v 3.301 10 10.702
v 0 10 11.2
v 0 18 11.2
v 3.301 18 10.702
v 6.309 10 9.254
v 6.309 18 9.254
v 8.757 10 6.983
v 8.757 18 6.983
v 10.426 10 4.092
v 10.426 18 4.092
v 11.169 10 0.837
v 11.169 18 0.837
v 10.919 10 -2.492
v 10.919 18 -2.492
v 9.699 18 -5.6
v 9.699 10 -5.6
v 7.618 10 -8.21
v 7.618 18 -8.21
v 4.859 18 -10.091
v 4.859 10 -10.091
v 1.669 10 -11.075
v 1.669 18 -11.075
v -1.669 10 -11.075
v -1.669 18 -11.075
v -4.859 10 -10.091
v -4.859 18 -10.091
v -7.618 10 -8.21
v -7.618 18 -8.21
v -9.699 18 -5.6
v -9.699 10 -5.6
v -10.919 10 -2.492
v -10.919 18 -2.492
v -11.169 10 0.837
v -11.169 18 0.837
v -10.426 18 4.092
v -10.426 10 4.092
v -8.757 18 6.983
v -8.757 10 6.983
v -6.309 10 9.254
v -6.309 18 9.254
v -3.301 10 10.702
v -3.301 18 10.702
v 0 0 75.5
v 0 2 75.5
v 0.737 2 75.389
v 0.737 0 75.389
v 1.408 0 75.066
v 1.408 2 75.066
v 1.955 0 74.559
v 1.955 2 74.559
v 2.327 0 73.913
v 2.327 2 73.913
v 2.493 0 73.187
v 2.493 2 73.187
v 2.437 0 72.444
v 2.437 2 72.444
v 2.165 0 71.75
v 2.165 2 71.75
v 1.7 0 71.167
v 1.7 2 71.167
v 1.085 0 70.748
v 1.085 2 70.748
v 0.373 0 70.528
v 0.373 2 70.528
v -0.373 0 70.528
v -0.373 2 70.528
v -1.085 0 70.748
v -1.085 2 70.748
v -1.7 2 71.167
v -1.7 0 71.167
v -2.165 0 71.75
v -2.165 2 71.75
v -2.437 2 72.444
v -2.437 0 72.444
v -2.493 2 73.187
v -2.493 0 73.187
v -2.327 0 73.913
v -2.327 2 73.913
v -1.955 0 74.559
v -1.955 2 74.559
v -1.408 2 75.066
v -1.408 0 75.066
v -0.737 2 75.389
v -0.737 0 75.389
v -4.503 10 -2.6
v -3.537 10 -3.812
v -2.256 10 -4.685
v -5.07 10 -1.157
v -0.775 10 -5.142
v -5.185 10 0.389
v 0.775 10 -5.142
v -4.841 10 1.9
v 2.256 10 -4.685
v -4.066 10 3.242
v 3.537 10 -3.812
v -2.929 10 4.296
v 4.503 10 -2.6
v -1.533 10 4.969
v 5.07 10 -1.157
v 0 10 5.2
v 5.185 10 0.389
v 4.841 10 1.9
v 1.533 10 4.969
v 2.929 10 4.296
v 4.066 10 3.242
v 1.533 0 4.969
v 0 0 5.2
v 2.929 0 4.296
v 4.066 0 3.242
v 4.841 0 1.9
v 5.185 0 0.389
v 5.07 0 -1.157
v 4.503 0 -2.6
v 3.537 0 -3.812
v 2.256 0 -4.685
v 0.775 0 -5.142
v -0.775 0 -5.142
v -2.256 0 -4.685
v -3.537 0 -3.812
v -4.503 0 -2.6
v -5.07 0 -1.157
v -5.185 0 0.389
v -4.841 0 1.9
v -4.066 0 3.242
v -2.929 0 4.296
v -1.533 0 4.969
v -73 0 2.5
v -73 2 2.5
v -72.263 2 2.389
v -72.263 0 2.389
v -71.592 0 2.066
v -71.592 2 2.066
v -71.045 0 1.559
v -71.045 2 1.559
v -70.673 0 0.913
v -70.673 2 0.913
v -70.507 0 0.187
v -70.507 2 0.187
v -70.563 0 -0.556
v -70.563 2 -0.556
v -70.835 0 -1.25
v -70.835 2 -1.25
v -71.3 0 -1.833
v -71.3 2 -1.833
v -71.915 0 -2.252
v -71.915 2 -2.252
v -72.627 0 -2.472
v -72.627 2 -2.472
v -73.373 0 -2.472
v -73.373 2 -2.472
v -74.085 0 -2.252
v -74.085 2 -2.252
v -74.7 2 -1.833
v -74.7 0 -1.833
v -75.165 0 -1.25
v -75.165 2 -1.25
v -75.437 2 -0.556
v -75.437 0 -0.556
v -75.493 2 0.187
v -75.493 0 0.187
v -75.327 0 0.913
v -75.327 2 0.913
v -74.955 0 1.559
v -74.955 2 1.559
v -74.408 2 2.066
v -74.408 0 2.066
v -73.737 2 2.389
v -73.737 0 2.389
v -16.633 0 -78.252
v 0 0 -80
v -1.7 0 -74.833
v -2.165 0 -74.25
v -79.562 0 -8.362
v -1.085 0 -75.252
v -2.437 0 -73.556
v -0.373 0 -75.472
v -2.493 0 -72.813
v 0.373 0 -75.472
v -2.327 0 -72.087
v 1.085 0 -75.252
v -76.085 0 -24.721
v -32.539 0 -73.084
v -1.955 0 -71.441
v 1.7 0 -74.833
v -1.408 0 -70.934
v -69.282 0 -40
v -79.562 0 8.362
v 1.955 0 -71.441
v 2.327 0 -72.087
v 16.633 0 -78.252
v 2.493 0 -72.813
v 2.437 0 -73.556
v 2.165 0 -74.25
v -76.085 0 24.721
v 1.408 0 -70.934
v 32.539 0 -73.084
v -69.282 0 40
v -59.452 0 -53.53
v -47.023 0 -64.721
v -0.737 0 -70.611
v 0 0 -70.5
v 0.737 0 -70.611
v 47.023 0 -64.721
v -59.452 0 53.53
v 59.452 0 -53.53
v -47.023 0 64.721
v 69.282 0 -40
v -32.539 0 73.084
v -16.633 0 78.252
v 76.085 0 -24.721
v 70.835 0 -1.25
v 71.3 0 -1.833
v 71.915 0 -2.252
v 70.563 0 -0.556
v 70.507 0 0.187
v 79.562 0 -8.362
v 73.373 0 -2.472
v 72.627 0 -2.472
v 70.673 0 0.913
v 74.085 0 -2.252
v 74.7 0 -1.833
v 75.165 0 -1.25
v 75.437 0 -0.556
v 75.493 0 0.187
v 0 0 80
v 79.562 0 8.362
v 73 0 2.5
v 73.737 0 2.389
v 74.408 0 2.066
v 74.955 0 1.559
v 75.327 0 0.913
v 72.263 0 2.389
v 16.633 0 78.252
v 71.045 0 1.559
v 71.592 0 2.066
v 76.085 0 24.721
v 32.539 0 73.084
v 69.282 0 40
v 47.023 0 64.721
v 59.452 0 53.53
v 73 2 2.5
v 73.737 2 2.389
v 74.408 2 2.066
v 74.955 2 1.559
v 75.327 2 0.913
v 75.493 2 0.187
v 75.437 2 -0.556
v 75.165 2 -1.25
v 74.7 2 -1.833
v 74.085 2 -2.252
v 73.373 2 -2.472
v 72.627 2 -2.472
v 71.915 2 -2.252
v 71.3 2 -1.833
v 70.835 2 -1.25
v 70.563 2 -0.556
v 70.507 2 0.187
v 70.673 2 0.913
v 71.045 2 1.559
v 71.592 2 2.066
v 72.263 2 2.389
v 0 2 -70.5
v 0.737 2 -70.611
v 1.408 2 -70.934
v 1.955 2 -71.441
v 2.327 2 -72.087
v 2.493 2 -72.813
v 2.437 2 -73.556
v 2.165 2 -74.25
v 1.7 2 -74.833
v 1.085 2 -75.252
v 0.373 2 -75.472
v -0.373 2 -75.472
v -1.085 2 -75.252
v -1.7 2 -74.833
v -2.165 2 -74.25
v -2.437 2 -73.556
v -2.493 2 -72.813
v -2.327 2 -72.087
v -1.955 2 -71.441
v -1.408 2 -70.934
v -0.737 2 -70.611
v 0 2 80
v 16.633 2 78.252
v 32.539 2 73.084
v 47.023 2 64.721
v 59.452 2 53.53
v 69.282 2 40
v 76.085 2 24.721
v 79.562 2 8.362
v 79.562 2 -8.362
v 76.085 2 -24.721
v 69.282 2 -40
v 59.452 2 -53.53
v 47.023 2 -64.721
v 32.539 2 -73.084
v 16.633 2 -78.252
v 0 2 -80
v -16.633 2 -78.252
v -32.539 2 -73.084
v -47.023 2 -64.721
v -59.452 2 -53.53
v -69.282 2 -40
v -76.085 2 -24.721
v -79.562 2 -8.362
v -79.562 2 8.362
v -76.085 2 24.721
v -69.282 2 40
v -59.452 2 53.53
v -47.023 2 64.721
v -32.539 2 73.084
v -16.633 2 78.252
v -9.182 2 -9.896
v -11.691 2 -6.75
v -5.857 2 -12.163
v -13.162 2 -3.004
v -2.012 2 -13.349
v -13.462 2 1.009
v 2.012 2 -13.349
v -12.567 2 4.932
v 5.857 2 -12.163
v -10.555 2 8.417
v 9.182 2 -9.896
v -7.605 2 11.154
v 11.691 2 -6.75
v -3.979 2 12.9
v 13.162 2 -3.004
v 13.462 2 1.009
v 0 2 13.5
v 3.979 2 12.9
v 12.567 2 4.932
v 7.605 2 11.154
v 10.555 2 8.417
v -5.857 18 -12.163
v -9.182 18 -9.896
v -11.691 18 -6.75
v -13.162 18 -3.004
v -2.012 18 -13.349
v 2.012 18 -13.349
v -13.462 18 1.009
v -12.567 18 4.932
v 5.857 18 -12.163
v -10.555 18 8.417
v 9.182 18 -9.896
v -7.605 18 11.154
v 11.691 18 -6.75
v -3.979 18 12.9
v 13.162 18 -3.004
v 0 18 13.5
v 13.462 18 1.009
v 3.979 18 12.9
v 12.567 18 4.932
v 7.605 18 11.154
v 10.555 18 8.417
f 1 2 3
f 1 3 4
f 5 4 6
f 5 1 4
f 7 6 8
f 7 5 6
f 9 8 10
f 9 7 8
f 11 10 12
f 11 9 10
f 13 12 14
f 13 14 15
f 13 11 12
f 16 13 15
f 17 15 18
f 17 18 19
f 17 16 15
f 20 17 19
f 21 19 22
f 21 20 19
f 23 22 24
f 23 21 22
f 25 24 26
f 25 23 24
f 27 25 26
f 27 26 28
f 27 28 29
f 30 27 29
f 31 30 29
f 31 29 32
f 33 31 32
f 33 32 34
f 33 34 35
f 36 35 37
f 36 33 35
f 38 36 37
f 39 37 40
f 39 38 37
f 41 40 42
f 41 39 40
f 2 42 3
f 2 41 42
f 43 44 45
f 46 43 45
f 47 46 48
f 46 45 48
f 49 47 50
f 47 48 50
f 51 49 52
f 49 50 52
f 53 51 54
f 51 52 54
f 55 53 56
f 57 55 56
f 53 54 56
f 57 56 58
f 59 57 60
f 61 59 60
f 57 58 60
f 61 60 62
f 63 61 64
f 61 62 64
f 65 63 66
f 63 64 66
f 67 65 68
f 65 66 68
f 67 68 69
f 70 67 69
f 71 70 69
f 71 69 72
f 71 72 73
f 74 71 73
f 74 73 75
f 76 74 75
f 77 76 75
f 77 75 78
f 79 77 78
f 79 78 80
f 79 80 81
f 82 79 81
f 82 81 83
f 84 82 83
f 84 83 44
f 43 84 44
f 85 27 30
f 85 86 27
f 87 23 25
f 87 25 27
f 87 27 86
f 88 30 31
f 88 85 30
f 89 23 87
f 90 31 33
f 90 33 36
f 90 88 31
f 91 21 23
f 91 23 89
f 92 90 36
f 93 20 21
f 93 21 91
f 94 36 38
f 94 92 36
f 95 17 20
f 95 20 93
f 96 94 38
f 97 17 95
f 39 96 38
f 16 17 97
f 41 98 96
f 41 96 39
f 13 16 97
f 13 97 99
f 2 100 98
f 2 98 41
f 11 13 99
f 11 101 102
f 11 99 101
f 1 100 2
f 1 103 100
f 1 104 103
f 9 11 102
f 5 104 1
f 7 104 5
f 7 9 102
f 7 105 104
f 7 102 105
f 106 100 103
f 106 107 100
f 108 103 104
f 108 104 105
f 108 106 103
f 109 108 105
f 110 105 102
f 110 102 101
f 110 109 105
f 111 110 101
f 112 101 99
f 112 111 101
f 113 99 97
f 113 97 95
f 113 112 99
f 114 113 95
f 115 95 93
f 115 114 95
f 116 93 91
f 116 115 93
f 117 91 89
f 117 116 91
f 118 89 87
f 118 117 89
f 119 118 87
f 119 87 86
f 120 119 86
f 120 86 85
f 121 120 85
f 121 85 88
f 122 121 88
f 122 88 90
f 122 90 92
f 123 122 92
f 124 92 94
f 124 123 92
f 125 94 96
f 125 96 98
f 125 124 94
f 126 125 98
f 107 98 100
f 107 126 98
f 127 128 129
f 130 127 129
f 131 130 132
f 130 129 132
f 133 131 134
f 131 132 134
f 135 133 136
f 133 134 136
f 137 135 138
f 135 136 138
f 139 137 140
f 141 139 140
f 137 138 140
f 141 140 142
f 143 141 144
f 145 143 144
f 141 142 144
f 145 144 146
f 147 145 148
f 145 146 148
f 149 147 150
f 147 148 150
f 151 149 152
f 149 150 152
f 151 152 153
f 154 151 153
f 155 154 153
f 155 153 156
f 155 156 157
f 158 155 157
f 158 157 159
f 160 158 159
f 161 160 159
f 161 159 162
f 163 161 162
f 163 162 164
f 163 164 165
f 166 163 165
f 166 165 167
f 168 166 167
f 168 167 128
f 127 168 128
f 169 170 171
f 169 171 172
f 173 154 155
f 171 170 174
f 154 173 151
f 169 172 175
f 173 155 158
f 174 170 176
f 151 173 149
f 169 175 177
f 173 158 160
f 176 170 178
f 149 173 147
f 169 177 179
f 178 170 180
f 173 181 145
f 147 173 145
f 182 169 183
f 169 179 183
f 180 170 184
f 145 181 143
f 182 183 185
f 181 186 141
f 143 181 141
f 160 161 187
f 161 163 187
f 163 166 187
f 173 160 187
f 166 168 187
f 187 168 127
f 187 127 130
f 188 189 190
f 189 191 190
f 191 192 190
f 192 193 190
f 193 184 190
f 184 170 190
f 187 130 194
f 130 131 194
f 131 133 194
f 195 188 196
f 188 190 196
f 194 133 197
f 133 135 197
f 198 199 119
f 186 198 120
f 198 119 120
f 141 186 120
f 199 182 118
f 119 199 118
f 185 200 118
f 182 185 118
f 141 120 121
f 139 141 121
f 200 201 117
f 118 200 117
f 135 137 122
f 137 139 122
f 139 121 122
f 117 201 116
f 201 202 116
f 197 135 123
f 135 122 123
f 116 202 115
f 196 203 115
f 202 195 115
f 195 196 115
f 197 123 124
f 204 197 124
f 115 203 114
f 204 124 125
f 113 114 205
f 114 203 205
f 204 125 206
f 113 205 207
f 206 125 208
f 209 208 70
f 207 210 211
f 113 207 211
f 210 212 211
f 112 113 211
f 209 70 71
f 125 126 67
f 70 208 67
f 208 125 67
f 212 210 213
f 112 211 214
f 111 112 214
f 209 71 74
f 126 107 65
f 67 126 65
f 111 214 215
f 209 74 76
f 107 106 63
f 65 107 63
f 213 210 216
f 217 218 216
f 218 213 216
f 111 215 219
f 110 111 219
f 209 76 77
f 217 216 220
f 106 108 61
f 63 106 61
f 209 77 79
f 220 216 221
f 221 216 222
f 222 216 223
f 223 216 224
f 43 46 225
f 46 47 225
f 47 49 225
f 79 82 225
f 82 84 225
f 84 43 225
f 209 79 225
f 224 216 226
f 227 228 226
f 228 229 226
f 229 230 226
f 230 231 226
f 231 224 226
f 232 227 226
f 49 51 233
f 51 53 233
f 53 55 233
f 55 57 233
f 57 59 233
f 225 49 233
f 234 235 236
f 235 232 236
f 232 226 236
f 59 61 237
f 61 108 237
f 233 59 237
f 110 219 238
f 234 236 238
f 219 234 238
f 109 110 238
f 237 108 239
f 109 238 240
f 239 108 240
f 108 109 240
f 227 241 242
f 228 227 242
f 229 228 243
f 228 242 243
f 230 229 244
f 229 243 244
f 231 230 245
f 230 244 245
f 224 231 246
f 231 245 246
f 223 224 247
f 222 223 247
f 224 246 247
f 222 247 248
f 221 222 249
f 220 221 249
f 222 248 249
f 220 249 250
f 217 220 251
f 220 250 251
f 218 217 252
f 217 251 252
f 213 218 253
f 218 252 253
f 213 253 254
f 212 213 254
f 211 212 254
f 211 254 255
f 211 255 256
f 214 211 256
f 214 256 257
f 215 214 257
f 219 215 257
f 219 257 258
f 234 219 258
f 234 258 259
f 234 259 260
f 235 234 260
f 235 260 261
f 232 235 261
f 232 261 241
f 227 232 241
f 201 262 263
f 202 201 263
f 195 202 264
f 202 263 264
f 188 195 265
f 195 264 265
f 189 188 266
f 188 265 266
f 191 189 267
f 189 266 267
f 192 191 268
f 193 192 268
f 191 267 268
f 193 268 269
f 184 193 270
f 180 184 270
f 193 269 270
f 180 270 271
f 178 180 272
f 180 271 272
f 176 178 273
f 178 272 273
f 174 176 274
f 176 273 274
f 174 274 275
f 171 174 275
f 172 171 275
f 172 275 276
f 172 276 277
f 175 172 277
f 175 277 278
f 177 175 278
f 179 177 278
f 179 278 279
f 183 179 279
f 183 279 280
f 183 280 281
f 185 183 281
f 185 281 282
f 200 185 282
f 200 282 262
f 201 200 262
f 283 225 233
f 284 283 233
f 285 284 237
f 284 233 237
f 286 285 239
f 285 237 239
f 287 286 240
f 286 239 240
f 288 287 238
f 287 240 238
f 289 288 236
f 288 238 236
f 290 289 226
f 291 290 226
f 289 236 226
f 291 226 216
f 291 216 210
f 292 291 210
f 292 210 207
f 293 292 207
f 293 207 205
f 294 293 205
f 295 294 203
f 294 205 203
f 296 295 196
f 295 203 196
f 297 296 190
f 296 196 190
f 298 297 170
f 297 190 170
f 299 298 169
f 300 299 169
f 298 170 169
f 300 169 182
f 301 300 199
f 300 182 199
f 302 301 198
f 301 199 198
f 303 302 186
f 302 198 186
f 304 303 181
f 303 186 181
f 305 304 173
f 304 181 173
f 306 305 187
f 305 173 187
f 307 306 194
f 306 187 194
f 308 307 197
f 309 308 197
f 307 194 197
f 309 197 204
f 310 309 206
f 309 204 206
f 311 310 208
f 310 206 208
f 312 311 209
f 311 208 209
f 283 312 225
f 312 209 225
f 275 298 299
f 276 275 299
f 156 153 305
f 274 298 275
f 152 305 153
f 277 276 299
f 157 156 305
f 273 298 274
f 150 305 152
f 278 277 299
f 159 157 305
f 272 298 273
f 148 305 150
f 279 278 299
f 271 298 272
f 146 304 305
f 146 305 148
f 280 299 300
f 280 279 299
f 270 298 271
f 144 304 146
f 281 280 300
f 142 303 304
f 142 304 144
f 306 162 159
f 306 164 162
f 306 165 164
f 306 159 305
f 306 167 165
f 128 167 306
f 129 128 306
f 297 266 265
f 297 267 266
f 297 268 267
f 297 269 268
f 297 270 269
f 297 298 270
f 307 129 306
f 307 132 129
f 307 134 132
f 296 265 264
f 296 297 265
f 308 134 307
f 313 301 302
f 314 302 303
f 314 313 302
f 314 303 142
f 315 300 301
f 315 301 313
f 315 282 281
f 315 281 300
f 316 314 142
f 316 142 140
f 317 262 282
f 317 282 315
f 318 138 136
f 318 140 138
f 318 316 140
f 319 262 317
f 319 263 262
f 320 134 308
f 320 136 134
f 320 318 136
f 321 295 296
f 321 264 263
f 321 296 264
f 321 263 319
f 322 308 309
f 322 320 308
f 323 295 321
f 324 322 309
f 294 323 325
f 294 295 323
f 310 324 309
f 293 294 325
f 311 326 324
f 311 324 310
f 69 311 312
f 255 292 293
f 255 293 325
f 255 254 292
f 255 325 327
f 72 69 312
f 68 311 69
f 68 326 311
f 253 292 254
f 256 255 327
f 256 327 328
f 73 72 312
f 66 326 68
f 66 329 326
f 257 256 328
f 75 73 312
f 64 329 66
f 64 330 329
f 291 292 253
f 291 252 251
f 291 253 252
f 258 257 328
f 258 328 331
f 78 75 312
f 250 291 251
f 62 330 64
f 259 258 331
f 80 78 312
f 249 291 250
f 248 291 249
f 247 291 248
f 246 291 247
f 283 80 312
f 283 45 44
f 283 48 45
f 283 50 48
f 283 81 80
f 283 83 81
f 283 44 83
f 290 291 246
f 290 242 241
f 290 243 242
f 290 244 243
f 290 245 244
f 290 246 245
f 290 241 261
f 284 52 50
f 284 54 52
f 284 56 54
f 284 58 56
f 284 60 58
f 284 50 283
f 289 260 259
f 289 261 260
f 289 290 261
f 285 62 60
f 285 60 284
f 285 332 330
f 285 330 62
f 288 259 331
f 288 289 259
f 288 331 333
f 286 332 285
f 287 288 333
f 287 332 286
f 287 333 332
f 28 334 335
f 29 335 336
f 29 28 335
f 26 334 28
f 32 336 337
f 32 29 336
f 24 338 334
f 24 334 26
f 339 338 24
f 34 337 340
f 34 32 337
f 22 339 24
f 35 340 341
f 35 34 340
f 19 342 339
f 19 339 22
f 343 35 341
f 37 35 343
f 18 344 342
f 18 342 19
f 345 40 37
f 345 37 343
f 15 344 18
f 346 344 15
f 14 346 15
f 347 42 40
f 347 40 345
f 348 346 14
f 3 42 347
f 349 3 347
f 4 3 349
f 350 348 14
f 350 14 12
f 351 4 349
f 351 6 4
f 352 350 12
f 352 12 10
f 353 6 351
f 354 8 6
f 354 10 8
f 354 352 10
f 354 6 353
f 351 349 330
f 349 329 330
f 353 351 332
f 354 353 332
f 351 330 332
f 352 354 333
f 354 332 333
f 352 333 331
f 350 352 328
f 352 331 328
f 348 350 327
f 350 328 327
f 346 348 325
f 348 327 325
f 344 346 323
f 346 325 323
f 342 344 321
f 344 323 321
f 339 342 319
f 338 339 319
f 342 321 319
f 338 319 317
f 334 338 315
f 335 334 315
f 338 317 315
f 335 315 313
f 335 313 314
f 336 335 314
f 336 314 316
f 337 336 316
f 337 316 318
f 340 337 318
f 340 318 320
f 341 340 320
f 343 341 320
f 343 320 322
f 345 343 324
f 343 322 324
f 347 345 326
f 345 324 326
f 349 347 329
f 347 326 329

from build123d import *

# Parameters (mm, degrees)
SKETCH1_R           = 80
SKETCH1_R_2         = 5.2
BOSS_EXTRUDE1_DEPTH = 2
SKETCH2_R           = 2.5
CUT_EXTRUDE1_DEPTH  = 114.154761279
SKETCH3_R           = 13.5
SKETCH3_R_2         = 5.2
BOSS_EXTRUDE2_DEPTH = 8
SKETCH4_R           = 13.5
SKETCH4_R_2         = 11.2
BOSS_EXTRUDE3_DEPTH = 8


with BuildPart() as part:
    # Sketch1 → Boss-Extrude1 (new body)
    with BuildSketch(Plane(origin=(0, 0, 0), x_dir=(1, 0, 0), z_dir=(0, 1, 0))):
        with Locations(Location((0, 0, 0), (0, 0, 270))):
            Circle(SKETCH1_R)
        with Locations(Location((0, 0, 0), (0, 0, 270))):
            Circle(SKETCH1_R_2, mode=Mode.SUBTRACT)
    extrude(amount=BOSS_EXTRUDE1_DEPTH)

    # Sketch2 → Cut-Extrude1 (cut, through all)
    with BuildSketch(Plane(origin=(0, 2, 0), x_dir=(1, 0, 0), z_dir=(0, 1, 0))):
        with Locations(Location((0, 73, 0), (0, 0, 270))):
            Circle(SKETCH2_R)
        with Locations(Location((73, 0, 0), (0, 0, 270))):
            Circle(SKETCH2_R)
        with Locations(Location((0, -73, 0), (0, 0, 270))):
            Circle(SKETCH2_R)
        with Locations(Location((-73, 0, 0), (0, 0, 270))):
            Circle(SKETCH2_R)
    extrude(amount=-CUT_EXTRUDE1_DEPTH, mode=Mode.SUBTRACT)

    # Sketch3 → Boss-Extrude2 (add)
    with BuildSketch(Plane(origin=(0, 2, 0), x_dir=(1, 0, 0), z_dir=(0, 1, 0))):
        with Locations(Location((0, 0, 0), (0, 0, 270))):
            Circle(SKETCH3_R)
        with Locations(Location((0, 0, 0), (0, 0, 270))):
            Circle(SKETCH3_R_2, mode=Mode.SUBTRACT)
    extrude(amount=BOSS_EXTRUDE2_DEPTH)

    # Sketch4 → Boss-Extrude3 (add)
    with BuildSketch(Plane(origin=(0, 10, 0), x_dir=(1, 0, 0), z_dir=(0, 1, 0))):
        with Locations(Location((0, 0, 0), (0, 0, 270))):
            Circle(SKETCH4_R)
        with Locations(Location((0, 0, 0), (0, 0, 270))):
            Circle(SKETCH4_R_2, mode=Mode.SUBTRACT)
    extrude(amount=BOSS_EXTRUDE3_DEPTH)


solid = part.part
